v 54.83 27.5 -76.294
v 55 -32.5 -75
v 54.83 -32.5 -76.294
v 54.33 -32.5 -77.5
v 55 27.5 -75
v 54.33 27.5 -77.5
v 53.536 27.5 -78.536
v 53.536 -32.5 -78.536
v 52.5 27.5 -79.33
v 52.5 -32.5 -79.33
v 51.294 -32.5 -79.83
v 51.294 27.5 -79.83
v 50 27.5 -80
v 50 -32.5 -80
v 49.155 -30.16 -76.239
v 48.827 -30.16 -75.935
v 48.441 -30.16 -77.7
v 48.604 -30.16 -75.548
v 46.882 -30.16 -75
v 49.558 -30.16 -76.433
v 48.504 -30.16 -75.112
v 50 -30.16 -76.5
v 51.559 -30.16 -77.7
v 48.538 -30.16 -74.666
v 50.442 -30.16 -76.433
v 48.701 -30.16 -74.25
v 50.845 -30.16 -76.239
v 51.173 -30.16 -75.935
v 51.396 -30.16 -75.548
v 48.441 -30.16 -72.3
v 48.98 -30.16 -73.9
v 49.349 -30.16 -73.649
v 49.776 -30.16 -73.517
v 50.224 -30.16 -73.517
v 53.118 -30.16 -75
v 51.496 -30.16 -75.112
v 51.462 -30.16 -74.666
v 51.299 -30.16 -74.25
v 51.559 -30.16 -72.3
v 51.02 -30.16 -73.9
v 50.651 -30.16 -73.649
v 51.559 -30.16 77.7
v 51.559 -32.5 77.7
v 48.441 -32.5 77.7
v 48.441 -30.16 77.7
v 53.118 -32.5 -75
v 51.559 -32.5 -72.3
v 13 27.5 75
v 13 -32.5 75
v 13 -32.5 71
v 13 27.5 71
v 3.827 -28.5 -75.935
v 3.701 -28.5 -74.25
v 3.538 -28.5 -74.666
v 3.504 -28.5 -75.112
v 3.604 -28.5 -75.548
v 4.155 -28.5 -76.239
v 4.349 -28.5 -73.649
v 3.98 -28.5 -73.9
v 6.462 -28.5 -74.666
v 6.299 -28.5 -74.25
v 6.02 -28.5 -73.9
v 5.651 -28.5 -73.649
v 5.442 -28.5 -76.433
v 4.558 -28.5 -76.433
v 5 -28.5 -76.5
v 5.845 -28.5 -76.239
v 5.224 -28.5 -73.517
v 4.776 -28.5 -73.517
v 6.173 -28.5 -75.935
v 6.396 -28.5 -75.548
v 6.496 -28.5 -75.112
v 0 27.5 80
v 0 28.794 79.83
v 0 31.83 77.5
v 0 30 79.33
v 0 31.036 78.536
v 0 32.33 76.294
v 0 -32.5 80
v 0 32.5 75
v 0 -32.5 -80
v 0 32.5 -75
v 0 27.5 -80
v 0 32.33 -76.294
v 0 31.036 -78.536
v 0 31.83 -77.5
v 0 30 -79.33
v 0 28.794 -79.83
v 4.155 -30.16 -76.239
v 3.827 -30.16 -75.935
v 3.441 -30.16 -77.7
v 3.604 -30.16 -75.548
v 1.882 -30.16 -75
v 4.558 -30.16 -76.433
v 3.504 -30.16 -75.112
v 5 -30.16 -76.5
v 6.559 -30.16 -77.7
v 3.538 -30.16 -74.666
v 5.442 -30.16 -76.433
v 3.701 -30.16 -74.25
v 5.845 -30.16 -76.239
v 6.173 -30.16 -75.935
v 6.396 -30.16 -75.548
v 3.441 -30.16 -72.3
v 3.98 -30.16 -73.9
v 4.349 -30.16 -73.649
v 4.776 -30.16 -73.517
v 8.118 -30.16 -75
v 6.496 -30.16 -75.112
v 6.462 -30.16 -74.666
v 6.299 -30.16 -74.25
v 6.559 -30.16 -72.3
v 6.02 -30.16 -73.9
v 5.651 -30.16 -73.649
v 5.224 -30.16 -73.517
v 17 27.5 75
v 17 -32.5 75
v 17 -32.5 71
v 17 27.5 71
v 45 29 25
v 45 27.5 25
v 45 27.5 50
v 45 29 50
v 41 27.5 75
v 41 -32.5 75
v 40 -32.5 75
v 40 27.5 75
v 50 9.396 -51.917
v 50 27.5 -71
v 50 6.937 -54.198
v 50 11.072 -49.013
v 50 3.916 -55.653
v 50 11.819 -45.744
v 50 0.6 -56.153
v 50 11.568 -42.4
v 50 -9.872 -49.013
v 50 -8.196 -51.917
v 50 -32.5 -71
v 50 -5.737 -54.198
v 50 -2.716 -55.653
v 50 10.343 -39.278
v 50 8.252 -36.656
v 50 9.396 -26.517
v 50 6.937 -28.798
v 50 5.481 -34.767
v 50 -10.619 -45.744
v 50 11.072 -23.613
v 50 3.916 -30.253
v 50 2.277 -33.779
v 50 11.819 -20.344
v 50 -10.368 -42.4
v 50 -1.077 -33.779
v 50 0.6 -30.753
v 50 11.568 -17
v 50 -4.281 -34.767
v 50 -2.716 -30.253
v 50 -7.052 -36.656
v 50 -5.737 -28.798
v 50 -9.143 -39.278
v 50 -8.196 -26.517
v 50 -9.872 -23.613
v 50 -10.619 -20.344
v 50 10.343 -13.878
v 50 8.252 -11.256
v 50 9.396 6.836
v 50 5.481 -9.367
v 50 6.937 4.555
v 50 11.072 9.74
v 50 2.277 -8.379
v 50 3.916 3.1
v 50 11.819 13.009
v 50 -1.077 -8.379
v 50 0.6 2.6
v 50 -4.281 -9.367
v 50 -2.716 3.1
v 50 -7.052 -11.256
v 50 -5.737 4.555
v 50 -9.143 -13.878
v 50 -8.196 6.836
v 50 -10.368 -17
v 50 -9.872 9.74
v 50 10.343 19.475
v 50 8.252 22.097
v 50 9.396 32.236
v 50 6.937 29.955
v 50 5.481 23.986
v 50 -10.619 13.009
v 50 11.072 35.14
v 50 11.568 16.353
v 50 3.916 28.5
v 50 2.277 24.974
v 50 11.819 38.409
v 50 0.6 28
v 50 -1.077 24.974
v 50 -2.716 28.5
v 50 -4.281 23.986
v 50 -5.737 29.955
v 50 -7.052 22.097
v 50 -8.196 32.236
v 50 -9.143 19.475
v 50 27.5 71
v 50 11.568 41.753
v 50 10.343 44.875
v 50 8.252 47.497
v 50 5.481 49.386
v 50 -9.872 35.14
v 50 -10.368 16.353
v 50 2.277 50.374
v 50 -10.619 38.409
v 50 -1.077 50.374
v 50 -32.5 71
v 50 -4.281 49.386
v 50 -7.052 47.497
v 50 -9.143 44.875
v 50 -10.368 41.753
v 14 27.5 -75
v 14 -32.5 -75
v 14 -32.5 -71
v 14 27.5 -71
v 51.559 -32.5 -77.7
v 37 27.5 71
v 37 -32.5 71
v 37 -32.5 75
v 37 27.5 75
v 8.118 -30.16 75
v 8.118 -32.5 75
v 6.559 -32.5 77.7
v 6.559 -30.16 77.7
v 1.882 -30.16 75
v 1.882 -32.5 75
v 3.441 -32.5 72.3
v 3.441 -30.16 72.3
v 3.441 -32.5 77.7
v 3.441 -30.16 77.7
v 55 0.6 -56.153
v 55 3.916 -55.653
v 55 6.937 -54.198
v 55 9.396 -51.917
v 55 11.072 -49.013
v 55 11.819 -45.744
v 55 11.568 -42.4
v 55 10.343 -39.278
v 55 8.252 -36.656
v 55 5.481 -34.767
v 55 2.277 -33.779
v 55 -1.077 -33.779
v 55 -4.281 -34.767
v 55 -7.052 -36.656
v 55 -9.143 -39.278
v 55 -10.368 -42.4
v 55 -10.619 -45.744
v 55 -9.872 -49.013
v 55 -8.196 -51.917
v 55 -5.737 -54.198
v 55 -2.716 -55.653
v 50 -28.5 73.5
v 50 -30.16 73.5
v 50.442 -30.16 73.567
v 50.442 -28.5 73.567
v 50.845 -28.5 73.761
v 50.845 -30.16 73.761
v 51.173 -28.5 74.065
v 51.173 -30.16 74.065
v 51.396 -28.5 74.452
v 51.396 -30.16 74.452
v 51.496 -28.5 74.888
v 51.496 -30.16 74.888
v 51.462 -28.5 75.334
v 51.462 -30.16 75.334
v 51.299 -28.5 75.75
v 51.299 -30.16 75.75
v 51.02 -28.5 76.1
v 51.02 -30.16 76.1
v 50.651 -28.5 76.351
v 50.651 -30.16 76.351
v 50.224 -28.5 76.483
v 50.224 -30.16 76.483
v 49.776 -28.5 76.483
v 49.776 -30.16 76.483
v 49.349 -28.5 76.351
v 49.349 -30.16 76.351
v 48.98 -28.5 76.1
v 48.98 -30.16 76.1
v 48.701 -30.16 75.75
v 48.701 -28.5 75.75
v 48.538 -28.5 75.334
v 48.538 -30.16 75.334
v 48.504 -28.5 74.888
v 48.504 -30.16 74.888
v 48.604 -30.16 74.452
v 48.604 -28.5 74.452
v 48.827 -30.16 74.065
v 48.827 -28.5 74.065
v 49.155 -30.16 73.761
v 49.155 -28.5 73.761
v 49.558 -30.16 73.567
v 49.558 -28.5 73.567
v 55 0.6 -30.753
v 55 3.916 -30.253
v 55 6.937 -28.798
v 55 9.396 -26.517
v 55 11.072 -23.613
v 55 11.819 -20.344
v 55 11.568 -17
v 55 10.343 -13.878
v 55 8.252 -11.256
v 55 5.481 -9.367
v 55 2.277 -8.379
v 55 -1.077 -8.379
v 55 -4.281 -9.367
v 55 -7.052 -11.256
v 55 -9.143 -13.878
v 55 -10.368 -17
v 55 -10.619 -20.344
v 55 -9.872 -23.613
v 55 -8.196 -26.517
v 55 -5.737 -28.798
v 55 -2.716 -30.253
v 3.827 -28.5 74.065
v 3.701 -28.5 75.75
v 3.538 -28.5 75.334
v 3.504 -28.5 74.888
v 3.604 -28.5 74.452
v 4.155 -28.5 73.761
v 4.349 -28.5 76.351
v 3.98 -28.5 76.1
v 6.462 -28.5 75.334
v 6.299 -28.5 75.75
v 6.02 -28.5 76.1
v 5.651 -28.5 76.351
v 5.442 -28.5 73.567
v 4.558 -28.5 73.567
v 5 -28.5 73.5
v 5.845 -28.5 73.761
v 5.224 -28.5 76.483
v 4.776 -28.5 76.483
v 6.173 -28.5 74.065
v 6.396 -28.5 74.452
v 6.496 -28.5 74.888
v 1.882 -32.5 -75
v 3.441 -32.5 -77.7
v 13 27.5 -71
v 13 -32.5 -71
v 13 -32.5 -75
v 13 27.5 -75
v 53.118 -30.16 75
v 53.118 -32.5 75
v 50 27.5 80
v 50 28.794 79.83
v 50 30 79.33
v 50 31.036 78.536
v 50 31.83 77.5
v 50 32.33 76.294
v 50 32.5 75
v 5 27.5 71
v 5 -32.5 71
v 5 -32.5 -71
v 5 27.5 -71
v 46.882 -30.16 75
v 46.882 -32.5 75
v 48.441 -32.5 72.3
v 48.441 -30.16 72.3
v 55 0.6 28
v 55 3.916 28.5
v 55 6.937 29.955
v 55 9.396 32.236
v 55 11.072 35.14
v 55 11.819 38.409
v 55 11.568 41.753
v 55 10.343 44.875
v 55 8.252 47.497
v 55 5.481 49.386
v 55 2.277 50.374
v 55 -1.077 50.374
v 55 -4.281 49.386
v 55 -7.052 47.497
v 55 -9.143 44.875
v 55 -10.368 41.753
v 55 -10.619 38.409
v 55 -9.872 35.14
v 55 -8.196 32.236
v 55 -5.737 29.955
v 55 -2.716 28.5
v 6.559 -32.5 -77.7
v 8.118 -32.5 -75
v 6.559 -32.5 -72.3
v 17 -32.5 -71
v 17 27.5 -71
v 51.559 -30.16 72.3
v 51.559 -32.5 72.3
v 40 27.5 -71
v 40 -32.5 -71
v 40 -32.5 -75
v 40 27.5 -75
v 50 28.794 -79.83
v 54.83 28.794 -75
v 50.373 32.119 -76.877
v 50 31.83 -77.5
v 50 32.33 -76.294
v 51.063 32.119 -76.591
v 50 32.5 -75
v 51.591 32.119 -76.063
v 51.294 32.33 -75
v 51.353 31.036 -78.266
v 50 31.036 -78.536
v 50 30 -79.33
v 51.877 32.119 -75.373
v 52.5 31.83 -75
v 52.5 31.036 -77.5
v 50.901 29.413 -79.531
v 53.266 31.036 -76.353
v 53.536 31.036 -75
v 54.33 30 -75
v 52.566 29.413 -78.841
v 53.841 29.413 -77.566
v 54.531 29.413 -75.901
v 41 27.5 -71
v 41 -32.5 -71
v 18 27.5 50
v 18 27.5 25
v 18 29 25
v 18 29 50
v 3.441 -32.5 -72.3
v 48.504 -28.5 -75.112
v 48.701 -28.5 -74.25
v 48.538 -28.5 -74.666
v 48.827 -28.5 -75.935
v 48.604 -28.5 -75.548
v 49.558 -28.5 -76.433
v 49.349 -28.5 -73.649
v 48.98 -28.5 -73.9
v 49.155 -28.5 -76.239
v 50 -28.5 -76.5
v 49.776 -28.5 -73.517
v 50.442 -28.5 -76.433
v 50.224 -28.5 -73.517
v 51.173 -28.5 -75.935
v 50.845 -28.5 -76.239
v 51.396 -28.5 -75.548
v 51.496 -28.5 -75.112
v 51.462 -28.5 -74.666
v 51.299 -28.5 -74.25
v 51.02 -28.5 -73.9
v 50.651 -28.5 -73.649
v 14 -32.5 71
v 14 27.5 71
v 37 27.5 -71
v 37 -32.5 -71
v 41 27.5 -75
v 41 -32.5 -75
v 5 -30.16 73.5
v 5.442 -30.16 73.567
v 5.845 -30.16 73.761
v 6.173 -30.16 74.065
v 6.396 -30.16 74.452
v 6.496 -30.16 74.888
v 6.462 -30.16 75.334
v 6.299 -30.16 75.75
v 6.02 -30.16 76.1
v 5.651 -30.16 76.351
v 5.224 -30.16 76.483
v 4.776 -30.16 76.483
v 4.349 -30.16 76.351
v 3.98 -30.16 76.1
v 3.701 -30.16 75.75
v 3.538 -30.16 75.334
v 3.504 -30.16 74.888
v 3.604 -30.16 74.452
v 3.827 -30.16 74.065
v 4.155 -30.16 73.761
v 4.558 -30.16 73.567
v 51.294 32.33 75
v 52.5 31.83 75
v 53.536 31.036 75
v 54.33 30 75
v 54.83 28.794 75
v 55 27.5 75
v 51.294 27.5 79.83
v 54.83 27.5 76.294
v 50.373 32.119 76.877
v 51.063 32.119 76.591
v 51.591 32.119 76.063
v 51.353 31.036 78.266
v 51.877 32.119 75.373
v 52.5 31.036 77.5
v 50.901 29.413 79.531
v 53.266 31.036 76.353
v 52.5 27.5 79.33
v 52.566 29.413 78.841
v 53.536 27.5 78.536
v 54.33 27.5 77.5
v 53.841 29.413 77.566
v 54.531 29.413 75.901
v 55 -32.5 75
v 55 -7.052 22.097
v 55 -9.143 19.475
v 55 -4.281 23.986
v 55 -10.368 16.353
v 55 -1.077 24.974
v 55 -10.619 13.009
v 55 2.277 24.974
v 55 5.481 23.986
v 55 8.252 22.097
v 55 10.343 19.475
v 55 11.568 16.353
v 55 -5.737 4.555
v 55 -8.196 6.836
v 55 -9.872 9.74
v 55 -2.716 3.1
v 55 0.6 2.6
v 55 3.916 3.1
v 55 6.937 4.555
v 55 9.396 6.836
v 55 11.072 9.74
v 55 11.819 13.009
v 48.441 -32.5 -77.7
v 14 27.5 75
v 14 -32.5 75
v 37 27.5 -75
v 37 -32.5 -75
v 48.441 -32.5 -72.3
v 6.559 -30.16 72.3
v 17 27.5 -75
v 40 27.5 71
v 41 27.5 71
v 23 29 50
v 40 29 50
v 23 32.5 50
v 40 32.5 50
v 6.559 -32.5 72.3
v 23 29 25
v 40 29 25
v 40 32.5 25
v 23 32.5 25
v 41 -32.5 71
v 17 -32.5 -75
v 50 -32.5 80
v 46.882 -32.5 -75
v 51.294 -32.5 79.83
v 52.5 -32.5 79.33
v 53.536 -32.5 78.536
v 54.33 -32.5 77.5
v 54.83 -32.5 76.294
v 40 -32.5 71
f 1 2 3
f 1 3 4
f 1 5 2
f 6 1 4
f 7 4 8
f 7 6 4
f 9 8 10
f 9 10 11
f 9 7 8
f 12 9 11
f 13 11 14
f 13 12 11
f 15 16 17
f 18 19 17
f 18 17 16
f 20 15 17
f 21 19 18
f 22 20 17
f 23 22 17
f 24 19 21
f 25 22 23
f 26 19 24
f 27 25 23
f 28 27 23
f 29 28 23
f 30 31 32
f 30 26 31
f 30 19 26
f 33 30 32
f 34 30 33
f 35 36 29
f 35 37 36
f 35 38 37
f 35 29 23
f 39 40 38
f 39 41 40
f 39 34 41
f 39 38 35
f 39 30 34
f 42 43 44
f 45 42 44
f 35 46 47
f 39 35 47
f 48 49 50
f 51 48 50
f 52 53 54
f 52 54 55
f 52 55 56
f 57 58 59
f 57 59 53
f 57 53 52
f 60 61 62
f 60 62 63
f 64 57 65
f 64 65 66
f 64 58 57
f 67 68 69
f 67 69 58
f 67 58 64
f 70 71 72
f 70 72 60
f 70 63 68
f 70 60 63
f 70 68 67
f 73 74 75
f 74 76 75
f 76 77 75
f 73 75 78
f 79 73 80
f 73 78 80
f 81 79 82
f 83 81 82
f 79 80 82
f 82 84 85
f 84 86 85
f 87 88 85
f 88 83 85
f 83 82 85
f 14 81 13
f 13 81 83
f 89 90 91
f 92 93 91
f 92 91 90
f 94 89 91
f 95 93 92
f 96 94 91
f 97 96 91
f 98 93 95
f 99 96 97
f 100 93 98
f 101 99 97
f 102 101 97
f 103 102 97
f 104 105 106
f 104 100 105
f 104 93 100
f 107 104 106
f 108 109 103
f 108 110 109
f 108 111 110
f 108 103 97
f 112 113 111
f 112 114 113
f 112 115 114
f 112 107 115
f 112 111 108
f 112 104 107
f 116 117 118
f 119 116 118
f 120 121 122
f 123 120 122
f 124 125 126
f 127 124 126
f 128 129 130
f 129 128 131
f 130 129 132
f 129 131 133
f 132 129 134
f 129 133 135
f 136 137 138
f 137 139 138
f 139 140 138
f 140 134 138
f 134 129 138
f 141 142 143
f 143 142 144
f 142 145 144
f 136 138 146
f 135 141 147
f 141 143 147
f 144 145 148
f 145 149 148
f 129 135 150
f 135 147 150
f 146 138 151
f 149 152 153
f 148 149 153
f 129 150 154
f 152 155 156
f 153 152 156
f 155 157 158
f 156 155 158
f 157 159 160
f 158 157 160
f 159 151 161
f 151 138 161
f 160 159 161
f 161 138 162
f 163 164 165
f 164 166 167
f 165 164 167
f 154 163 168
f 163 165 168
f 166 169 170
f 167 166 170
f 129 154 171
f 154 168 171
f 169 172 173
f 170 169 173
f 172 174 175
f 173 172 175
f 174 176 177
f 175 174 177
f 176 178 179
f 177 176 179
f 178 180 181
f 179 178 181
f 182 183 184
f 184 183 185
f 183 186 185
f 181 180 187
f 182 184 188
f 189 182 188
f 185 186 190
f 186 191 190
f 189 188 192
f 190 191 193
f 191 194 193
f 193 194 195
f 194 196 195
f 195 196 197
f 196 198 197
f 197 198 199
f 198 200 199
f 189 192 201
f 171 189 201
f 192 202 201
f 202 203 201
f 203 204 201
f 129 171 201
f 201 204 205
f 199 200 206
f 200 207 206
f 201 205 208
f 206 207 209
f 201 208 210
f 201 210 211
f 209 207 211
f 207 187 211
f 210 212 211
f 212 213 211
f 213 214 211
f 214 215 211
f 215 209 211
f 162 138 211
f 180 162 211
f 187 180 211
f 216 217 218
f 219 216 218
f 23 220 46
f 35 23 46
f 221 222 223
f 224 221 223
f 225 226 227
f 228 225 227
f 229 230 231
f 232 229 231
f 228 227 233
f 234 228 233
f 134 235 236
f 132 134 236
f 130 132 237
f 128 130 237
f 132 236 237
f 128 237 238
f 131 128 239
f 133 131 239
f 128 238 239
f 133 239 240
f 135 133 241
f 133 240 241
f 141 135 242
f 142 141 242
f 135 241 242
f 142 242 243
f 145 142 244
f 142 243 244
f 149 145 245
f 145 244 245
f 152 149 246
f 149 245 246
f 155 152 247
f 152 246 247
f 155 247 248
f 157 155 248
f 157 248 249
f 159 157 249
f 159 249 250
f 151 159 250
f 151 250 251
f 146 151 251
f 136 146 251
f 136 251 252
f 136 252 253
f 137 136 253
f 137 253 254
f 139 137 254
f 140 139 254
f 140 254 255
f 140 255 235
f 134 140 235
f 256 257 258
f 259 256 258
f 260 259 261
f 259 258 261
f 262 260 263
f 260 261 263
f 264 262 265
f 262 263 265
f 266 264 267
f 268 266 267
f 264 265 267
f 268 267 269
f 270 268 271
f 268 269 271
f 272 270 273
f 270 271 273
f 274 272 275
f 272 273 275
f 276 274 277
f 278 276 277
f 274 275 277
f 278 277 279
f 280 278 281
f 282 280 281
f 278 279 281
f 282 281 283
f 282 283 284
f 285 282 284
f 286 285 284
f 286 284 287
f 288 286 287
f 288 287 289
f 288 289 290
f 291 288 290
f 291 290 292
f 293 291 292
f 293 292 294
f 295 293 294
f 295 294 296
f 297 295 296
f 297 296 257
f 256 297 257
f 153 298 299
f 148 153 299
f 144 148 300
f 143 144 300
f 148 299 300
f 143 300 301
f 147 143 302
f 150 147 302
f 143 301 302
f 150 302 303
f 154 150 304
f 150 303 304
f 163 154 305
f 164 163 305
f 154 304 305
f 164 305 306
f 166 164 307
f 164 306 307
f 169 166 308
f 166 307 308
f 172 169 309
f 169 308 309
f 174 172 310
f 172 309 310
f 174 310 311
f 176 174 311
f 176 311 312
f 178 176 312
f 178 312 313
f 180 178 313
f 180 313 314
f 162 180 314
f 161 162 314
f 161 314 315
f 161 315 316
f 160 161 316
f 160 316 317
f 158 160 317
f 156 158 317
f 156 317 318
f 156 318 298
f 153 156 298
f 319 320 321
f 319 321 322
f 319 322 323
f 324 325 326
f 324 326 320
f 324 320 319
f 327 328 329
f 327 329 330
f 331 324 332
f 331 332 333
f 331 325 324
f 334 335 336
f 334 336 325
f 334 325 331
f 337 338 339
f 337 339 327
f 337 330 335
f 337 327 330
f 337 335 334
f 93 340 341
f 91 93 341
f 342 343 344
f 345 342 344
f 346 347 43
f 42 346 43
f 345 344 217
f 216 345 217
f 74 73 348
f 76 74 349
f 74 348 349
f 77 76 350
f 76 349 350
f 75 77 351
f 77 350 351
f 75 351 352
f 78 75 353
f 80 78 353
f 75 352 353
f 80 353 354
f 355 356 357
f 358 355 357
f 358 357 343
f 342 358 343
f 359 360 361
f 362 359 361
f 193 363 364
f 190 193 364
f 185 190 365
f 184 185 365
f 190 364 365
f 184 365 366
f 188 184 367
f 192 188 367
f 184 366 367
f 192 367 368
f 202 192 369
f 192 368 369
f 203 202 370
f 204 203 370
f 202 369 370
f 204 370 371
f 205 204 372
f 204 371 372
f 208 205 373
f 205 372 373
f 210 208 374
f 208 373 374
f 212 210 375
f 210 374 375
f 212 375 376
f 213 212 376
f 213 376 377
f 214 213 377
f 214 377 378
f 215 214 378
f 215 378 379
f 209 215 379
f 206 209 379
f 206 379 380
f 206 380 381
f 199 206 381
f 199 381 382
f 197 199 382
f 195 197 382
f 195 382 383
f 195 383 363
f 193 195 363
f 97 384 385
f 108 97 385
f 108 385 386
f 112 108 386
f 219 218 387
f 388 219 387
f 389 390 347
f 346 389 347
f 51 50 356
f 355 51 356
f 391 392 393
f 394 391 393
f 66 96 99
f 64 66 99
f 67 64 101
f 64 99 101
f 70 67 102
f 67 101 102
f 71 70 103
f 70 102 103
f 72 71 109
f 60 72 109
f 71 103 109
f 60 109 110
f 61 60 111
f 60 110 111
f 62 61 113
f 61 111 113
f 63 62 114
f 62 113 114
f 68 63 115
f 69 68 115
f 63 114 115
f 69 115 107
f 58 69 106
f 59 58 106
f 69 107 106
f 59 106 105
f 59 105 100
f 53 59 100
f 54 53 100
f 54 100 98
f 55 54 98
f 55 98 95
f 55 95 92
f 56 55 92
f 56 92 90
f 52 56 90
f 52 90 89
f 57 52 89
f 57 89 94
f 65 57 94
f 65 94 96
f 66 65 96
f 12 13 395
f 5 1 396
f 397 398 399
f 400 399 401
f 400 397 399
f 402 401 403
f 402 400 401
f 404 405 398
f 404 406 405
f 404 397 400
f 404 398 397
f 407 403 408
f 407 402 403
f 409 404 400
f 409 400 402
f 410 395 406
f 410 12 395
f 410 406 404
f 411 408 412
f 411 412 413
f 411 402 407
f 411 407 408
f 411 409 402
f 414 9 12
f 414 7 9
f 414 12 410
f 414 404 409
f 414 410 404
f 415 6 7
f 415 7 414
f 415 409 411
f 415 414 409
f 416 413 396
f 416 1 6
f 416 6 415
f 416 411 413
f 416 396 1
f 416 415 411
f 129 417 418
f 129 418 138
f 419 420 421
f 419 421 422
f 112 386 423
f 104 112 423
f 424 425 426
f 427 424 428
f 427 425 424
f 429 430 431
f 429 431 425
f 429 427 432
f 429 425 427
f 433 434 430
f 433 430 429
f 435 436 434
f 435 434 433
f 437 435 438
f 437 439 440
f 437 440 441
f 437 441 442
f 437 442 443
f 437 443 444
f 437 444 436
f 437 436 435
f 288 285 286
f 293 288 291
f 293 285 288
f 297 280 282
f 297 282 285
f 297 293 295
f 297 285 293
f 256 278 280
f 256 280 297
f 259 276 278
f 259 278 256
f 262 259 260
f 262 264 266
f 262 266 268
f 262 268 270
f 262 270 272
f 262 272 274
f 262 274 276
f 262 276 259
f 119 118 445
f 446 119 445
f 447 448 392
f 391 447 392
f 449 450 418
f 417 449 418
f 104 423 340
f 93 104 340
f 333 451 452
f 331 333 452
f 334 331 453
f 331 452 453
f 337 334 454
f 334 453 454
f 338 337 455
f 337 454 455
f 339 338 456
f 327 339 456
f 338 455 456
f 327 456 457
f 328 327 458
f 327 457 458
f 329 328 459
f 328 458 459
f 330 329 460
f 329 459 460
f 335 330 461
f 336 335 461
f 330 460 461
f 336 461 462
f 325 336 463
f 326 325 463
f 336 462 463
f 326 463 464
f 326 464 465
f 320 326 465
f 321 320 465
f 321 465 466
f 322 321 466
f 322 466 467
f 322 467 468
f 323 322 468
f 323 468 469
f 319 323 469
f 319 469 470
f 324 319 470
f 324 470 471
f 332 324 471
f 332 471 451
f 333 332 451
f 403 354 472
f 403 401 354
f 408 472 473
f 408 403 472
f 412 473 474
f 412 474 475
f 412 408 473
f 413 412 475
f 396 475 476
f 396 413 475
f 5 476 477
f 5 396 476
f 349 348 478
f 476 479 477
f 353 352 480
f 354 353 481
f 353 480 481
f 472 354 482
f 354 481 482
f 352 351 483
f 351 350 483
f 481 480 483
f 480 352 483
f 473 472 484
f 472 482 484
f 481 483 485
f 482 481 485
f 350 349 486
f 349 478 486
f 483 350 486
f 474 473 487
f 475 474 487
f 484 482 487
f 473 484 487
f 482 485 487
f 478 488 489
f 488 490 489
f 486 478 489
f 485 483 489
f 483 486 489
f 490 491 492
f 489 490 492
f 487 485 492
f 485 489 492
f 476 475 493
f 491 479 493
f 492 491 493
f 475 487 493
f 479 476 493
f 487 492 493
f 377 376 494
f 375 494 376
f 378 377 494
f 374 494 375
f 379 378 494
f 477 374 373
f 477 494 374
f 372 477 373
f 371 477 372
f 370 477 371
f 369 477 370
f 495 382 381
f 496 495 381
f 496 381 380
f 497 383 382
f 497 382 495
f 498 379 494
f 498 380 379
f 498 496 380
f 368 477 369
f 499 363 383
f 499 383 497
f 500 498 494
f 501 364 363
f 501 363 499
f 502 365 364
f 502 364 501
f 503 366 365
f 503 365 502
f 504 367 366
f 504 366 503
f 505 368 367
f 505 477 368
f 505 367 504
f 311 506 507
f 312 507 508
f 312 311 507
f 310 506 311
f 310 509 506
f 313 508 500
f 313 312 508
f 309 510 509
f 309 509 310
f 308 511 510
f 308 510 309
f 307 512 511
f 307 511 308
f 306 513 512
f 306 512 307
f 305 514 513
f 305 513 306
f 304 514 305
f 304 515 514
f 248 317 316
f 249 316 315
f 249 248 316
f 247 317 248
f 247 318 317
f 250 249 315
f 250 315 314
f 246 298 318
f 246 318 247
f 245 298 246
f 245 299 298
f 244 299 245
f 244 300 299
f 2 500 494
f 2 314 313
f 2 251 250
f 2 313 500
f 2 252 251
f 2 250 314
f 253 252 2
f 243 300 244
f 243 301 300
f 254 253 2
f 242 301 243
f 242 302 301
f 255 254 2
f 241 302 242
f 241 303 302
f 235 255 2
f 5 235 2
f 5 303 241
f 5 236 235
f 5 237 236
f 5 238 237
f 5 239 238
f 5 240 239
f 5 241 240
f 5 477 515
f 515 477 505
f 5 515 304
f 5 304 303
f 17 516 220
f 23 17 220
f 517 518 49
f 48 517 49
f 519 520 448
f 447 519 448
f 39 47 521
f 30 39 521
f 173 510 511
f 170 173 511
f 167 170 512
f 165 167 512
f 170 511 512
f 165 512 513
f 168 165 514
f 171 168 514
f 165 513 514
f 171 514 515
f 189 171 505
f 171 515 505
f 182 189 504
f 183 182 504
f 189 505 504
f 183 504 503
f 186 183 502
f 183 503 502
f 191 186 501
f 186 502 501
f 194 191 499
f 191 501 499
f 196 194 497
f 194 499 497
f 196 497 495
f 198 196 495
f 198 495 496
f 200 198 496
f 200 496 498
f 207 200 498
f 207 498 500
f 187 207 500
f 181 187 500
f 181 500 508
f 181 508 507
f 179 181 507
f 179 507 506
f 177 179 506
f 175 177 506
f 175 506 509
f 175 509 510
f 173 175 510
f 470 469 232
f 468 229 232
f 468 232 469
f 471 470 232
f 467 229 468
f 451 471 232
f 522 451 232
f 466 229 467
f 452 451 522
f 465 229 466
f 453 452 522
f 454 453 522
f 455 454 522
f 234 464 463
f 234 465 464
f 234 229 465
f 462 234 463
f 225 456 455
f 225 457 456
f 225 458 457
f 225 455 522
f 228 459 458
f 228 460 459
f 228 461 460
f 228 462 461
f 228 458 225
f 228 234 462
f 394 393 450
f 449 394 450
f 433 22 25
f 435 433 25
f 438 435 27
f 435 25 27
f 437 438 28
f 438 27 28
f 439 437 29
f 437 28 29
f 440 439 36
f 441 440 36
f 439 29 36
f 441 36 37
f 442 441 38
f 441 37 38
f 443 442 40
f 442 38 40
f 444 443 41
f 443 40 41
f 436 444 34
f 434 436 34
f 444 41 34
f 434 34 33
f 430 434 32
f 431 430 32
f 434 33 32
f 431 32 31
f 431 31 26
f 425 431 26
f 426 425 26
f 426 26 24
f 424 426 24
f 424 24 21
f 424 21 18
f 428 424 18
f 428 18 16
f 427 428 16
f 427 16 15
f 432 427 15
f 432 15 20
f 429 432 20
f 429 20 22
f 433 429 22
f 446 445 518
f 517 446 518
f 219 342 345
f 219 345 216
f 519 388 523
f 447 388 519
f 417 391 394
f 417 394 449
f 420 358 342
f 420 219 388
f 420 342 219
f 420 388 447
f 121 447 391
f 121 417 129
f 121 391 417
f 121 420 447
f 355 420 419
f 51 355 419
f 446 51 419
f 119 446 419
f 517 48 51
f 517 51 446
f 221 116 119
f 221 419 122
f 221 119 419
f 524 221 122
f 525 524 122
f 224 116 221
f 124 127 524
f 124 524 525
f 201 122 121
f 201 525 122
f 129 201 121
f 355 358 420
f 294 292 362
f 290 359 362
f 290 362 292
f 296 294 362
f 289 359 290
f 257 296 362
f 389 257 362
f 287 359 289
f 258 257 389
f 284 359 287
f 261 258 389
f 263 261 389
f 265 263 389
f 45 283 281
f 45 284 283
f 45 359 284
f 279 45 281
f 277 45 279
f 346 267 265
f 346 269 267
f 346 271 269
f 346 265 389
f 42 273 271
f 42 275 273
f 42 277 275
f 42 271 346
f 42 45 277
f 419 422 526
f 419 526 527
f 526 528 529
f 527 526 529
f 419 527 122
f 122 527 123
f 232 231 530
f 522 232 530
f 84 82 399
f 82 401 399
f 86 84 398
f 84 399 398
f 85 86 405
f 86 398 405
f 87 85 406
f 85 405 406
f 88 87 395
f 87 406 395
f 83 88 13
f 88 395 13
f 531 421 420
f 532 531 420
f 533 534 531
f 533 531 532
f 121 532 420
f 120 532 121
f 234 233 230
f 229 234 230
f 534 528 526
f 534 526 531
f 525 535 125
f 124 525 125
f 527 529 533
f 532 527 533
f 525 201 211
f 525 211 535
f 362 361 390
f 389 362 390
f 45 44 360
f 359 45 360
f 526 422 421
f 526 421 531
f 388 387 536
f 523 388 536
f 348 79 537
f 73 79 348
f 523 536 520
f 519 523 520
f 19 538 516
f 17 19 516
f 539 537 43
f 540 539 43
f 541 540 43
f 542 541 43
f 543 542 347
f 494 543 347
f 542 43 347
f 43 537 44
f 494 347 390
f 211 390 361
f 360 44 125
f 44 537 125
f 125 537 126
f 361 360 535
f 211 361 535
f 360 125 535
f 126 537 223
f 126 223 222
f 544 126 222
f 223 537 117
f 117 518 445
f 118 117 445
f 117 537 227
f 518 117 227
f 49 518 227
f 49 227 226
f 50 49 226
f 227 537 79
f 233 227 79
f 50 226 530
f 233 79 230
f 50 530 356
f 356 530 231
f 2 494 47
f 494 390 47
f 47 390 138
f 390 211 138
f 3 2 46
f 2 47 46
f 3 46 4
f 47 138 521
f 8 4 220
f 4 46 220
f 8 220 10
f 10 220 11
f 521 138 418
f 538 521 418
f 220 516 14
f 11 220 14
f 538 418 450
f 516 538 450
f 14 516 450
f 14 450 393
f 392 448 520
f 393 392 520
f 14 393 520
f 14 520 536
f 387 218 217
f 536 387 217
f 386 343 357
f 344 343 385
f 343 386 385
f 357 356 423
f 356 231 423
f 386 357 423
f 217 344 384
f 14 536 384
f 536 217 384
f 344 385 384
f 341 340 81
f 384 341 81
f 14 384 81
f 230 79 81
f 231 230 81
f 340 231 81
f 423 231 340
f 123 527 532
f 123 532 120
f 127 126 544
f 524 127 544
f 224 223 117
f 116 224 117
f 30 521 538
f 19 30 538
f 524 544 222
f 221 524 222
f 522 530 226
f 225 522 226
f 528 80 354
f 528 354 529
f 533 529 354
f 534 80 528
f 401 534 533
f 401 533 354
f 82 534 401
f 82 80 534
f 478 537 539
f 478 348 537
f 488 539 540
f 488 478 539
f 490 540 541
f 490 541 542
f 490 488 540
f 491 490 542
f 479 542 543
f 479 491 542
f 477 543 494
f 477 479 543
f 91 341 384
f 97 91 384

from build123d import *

# Parameters (mm, degrees)
SKETCH_1_W          = 160
SKETCH_1_H          = 65
EXTRUDE_1_DEPTH     = 55
CUT_EXTRUDE_3_DEPTH = 60
SKETCH_6_W          = 17
SKETCH_6_H          = 25
CUT_EXTRUDE_4_DEPTH = 60
SKETCH_7_W          = 27
SKETCH_7_H          = 25
CUT_EXTRUDE_5_DEPTH = 1.5
SKETCH_9_R          = 11.25
CUT_EXTRUDE_6_DEPTH = 10
FILLET_3_R          = 5
CUT_EXTRUDE_7_DEPTH = 2.34
SKETCH_12_R         = 1.5
CUT_EXTRUDE_8_DEPTH = 4


with BuildPart() as part:
    # Эскиз1 → Бобышка-Вытянуть1 (new body)
    with BuildSketch(Plane(origin=(0, 0, 0), x_dir=(0, 0, -1), z_dir=(1, 0, 0))):
        Rectangle(SKETCH_1_W, SKETCH_1_H)
    extrude(amount=EXTRUDE_1_DEPTH)

    # Эскиз2 → Вырез-Вытянуть3 (cut)
    with BuildSketch(Plane.XZ.offset(32.5)):
        Polygon((5, -71), (10, -71), (13, -71), (13, -75), (14, -75), (14, -71), (17, -71), (17, -75), (37, -75), (37, -71), (40, -71), (40, -75), (41, -75), (41, -71), (44, -71), (50, -71), (50, 71), (44, 71), (41, 71), (41, 75), (40, 75), (40, 71), (37, 71), (37, 75), (17, 75), (17, 71), (14, 71), (14, 75), (13, 75), (13, 71), (10, 71), (5, 71), align=None)
    extrude(amount=-CUT_EXTRUDE_3_DEPTH, mode=Mode.SUBTRACT)

    # Эскиз6 → Вырез-Вытянуть4 (cut)
    with BuildSketch(Plane(origin=(0, 32.5, 0), x_dir=(1, 0, 0), z_dir=(0, 1, 0))):
        with Locations((31.5, -37.5)):
            Rectangle(SKETCH_6_W, SKETCH_6_H)
    extrude(amount=-CUT_EXTRUDE_4_DEPTH, mode=Mode.SUBTRACT)

    # Эскиз7 → Вырез-Вытянуть5 (cut)
    with BuildSketch(Plane.XZ.offset(-27.5)):
        with Locations((31.5, 37.5)):
            Rectangle(SKETCH_7_W, SKETCH_7_H)
    extrude(amount=-CUT_EXTRUDE_5_DEPTH, mode=Mode.SUBTRACT)

    # Эскиз9 → Вырез-Вытянуть6 (cut)
    with BuildSketch(Plane(origin=(55, 0, 0), x_dir=(0, 0, -1), z_dir=(1, 0, 0))):
        with Locations((-39.25, 0.6)):
            Circle(SKETCH_9_R)
        with Locations((19.503, 0.6)):
            Circle(SKETCH_9_R)
        with Locations((44.903, 0.6)):
            Circle(SKETCH_9_R)
        with Locations((-13.85, 0.6)):
            Circle(SKETCH_9_R)
    extrude(amount=-CUT_EXTRUDE_6_DEPTH, mode=Mode.SUBTRACT)

    # Скругление3
    fillet_3_edges = [part.edges().sort_by_distance(p)[0] for p in [
        (55, 0, -80),
        (55, 0, 80),
        (27.5, 32.5, -80),
        (27.5, 32.5, 80),
        (55, 32.5, 0),
    ]]
    fillet(fillet_3_edges, radius=FILLET_3_R)

    # Эскиз10 → Вырез-Вытянуть7 (cut)
    with BuildSketch(Plane.XZ.offset(32.5)):
        Polygon((51.558845727, 72.3), (53.117691454, 75), (51.558845727, 77.7), (48.441154273, 77.7), (46.882308546, 75), (48.441154273, 72.3), align=None)
        Polygon((6.558845727, 72.3), (8.117691454, 75), (6.558845727, 77.7), (3.441154273, 77.7), (1.882308546, 75), (3.441154273, 72.3), align=None)
        Polygon((8.117691454, -75), (6.558845727, -72.3), (3.441154273, -72.3), (1.882308546, -75), (3.441154273, -77.7), (6.558845727, -77.7), align=None)
        Polygon((51.558845727, -77.7), (53.117691454, -75), (51.558845727, -72.3), (48.441154273, -72.3), (46.882308546, -75), (48.441154273, -77.7), align=None)
    extrude(amount=-CUT_EXTRUDE_7_DEPTH, mode=Mode.SUBTRACT)

    # Эскиз12 → Вырез-Вытянуть8 (cut)
    with BuildSketch(Plane.XZ.offset(32.5)):
        with Locations(Location((50, 75, 0), (0, 0, 270))):
            Circle(SKETCH_12_R)
        with Locations(Location((50, -75, 0), (0, 0, 270))):
            Circle(SKETCH_12_R)
        with Locations(Location((5, -75, 0), (0, 0, 270))):
            Circle(SKETCH_12_R)
        with Locations(Location((5, 75, 0), (0, 0, 270))):
            Circle(SKETCH_12_R)
    extrude(amount=-CUT_EXTRUDE_8_DEPTH, mode=Mode.SUBTRACT)


solid = part.part
